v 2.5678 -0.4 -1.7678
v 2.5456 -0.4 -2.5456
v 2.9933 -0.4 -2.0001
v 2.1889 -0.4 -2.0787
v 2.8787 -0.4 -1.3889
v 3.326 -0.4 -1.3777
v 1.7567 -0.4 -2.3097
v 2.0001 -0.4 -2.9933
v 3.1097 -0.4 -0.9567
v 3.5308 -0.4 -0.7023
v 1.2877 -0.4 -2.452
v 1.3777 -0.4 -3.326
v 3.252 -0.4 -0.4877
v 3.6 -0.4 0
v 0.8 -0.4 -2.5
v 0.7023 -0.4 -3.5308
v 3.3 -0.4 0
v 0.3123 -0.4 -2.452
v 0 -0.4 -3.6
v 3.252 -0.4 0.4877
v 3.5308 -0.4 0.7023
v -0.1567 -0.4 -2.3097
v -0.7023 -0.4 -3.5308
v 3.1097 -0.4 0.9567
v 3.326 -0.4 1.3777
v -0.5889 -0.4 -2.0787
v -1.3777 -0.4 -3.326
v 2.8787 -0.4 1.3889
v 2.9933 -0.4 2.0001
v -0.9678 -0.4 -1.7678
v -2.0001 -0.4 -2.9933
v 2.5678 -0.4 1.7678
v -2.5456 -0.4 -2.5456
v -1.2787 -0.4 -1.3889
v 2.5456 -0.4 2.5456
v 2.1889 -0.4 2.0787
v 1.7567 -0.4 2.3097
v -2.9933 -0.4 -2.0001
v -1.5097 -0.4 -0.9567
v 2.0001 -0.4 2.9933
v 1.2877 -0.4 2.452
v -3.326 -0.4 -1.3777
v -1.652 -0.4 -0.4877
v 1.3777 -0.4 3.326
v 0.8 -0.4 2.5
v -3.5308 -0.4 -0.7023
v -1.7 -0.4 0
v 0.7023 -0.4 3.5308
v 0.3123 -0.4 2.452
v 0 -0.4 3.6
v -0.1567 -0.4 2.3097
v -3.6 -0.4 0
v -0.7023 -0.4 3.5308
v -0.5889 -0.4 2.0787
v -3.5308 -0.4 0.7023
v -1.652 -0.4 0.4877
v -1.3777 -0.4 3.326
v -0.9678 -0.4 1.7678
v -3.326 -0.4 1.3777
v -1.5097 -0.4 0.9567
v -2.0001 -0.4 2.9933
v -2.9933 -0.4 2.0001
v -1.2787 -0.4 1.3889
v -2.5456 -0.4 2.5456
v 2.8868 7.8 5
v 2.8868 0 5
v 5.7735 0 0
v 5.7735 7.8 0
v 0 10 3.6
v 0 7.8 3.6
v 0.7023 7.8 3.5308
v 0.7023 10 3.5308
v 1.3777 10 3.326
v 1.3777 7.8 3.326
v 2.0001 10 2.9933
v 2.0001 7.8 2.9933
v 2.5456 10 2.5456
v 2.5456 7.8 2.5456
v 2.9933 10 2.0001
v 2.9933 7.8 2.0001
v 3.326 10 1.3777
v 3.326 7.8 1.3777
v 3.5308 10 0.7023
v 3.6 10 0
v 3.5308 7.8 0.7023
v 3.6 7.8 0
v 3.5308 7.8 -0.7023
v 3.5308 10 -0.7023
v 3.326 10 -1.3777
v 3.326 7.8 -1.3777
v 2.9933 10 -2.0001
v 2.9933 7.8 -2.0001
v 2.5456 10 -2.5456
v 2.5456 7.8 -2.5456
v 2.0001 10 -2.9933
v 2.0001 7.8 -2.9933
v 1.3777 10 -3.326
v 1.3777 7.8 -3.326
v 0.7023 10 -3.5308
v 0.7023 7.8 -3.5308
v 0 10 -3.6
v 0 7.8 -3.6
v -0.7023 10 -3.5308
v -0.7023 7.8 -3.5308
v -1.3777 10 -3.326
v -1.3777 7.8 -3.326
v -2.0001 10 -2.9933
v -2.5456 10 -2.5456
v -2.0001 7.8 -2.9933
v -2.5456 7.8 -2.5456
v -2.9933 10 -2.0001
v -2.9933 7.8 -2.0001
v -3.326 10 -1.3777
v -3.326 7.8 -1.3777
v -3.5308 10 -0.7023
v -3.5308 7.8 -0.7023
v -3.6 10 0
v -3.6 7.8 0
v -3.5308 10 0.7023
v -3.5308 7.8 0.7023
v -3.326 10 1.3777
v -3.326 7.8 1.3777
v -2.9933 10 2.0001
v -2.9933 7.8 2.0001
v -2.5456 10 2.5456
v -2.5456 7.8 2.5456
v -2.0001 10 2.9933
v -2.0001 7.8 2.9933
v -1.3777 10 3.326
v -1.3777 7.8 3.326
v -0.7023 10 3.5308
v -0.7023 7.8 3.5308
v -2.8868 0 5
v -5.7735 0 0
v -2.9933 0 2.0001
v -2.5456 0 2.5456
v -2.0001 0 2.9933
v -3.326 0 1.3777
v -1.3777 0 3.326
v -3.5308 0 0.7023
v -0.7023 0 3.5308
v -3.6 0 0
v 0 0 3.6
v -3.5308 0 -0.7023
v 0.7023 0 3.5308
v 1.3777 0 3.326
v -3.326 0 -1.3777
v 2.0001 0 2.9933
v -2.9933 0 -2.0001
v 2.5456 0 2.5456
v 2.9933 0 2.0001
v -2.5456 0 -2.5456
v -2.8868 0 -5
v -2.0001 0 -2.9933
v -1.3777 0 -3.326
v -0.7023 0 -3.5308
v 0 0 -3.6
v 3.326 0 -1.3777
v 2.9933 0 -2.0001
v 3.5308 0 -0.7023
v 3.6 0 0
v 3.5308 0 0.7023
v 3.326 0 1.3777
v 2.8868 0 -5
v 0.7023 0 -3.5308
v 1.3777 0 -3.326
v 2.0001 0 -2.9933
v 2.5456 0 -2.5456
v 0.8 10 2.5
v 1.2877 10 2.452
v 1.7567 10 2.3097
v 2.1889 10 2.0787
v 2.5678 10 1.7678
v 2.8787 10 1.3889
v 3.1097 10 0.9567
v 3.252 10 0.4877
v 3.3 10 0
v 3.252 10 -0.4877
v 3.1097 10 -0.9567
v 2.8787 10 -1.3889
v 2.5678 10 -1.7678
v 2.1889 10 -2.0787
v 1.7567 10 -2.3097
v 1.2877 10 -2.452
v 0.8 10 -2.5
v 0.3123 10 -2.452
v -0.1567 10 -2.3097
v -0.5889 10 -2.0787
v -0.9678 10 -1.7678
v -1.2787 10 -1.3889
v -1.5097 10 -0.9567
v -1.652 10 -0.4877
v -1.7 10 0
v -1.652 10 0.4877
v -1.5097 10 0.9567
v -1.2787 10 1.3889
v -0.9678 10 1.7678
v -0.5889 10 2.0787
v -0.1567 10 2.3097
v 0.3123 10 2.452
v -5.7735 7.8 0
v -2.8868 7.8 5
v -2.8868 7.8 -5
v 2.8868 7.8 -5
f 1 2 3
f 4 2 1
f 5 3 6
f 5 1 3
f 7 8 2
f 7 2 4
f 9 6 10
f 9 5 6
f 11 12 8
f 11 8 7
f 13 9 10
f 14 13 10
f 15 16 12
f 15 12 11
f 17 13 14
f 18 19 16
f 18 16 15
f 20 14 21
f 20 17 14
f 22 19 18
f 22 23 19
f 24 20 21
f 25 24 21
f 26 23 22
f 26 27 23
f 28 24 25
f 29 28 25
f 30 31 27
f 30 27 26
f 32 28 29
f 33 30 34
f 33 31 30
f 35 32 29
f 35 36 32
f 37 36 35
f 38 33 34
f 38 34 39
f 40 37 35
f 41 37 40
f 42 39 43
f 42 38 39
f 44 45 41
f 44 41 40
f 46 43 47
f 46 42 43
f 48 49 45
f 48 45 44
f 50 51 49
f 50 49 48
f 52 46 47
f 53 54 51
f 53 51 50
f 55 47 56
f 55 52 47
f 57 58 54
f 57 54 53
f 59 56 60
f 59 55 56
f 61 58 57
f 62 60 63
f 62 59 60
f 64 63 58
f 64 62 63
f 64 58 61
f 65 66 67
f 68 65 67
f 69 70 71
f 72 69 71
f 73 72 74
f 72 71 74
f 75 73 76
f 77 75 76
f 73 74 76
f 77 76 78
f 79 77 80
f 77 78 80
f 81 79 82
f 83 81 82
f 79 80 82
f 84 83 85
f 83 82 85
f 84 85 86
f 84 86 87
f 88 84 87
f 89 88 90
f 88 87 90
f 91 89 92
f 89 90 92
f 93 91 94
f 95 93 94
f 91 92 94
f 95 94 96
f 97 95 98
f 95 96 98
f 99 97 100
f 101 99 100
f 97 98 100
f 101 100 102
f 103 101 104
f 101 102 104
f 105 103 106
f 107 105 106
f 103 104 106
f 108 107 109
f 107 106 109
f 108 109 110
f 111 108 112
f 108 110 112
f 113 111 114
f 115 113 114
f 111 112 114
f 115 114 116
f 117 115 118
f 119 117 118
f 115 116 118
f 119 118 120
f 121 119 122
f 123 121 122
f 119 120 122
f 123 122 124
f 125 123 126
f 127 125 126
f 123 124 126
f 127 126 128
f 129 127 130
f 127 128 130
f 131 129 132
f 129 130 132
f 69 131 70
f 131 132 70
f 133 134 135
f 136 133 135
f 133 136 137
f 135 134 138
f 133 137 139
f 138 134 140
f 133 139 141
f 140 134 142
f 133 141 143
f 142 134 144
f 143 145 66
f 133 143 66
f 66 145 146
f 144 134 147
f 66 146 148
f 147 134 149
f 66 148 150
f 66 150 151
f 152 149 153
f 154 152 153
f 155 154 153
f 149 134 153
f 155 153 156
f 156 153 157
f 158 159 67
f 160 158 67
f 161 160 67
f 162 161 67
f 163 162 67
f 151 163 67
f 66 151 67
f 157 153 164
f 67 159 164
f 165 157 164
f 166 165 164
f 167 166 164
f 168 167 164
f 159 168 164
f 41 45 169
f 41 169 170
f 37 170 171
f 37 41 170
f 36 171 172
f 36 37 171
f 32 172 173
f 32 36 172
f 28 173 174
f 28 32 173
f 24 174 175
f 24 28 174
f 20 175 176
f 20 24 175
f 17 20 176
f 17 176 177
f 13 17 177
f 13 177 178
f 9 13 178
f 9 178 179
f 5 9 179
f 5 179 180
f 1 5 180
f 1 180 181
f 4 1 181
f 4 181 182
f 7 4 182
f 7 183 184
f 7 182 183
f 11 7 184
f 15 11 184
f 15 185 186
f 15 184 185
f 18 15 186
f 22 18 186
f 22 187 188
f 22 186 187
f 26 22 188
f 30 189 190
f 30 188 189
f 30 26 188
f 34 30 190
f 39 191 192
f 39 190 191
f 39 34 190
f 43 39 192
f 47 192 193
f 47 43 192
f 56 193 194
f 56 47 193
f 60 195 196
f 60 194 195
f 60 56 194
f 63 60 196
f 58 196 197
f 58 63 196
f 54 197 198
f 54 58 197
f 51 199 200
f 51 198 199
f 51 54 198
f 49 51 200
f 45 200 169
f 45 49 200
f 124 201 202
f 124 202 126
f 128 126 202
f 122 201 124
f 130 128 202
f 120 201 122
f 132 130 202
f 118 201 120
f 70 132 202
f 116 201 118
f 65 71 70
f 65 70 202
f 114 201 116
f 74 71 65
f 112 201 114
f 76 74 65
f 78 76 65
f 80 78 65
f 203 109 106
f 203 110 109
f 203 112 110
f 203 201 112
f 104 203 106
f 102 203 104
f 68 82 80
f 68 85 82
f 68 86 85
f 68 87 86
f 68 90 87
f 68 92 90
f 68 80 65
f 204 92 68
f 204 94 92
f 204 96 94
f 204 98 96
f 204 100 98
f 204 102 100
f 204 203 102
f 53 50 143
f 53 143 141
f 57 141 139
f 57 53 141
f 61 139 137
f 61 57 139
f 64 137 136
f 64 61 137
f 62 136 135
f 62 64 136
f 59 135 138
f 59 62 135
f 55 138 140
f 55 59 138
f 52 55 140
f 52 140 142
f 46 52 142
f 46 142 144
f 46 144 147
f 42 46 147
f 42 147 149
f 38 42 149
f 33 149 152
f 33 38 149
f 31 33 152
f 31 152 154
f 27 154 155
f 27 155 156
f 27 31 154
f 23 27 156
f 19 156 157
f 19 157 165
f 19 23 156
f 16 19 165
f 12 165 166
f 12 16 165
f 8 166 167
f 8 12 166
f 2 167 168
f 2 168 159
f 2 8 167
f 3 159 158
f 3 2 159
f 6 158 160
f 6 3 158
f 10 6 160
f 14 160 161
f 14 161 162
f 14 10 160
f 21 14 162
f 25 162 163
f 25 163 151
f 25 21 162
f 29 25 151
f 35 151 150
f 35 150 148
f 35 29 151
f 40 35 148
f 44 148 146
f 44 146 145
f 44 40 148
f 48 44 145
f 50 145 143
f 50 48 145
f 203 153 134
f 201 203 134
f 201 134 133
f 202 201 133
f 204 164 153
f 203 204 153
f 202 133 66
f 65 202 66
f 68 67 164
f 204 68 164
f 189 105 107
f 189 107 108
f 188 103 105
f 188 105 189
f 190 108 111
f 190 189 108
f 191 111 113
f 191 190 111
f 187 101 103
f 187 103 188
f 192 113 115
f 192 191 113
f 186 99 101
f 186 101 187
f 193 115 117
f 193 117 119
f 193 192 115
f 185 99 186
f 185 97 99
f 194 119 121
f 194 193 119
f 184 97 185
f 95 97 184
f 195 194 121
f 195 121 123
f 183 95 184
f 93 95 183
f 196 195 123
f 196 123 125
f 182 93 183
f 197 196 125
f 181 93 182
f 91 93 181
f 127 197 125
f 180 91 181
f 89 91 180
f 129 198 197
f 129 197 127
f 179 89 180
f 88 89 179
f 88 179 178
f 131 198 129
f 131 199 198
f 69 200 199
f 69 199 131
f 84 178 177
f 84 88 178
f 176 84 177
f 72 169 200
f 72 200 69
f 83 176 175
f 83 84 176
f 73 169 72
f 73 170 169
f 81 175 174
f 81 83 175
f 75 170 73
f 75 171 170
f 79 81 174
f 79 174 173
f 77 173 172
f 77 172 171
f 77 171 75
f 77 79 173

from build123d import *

# Parameters (mm, degrees)
BOSS_EXTRUDE1_DEPTH     = 7.8
SKETCH2_R               = 3.6
BOSS_EXTRUDE2_DEPTH     = 2.2
BOSS_EXTRUDE3_START     = 0.4
SKETCH3_R               = 3.6
BOSS_EXTRUDE3_DEPTH     = 0.4
CUT_EXTRUDE1_DEPTH      = 13.583057392
CUT_EXTRUDE1_DEPTH_BACK = 13.583057392
SKETCH4_R               = 2.5


with BuildPart() as part:
    # Sketch1 → Boss-Extrude1 (new body)
    with BuildSketch(Plane(origin=(0, 0, 0), x_dir=(1, 0, 0), z_dir=(0, 1, 0))):
        Polygon((5.773502692, 0), (2.886751346, 5), (-2.886751346, 5), (-5.773502692, 0), (-2.886751346, -5), (2.886751346, -5), align=None)
    extrude(amount=BOSS_EXTRUDE1_DEPTH)

    # Sketch2 → Boss-Extrude2 (add)
    with BuildSketch(Plane(origin=(0, 7.8, 0), x_dir=(1, 0, 0), z_dir=(0, 1, 0))):
        with Locations(Location((0, 0, 0), (0, 0, 270))):
            Circle(SKETCH2_R)
    extrude(amount=BOSS_EXTRUDE2_DEPTH)

    # Sketch3 → Boss-Extrude3 (add)
    with BuildSketch(Plane.XZ.offset(BOSS_EXTRUDE3_START)):
        with Locations(Location((0, 0, 0), (0, 0, 90))):
            Circle(SKETCH3_R)
    extrude(amount=-BOSS_EXTRUDE3_DEPTH)

    # Sketch4 → Cut-Extrude1 (cut, two sides: drawn at the far end of the back side and taken through both)
    with BuildSketch(Plane(origin=(0, 0, 0), x_dir=(1, 0, 0), z_dir=(0, 1, 0)).offset(-CUT_EXTRUDE1_DEPTH_BACK)):
        with Locations(Location((0.8, 0, 0), (0, 0, 270))):
            Circle(SKETCH4_R)
    extrude(amount=CUT_EXTRUDE1_DEPTH + CUT_EXTRUDE1_DEPTH_BACK, mode=Mode.SUBTRACT)


solid = part.part
